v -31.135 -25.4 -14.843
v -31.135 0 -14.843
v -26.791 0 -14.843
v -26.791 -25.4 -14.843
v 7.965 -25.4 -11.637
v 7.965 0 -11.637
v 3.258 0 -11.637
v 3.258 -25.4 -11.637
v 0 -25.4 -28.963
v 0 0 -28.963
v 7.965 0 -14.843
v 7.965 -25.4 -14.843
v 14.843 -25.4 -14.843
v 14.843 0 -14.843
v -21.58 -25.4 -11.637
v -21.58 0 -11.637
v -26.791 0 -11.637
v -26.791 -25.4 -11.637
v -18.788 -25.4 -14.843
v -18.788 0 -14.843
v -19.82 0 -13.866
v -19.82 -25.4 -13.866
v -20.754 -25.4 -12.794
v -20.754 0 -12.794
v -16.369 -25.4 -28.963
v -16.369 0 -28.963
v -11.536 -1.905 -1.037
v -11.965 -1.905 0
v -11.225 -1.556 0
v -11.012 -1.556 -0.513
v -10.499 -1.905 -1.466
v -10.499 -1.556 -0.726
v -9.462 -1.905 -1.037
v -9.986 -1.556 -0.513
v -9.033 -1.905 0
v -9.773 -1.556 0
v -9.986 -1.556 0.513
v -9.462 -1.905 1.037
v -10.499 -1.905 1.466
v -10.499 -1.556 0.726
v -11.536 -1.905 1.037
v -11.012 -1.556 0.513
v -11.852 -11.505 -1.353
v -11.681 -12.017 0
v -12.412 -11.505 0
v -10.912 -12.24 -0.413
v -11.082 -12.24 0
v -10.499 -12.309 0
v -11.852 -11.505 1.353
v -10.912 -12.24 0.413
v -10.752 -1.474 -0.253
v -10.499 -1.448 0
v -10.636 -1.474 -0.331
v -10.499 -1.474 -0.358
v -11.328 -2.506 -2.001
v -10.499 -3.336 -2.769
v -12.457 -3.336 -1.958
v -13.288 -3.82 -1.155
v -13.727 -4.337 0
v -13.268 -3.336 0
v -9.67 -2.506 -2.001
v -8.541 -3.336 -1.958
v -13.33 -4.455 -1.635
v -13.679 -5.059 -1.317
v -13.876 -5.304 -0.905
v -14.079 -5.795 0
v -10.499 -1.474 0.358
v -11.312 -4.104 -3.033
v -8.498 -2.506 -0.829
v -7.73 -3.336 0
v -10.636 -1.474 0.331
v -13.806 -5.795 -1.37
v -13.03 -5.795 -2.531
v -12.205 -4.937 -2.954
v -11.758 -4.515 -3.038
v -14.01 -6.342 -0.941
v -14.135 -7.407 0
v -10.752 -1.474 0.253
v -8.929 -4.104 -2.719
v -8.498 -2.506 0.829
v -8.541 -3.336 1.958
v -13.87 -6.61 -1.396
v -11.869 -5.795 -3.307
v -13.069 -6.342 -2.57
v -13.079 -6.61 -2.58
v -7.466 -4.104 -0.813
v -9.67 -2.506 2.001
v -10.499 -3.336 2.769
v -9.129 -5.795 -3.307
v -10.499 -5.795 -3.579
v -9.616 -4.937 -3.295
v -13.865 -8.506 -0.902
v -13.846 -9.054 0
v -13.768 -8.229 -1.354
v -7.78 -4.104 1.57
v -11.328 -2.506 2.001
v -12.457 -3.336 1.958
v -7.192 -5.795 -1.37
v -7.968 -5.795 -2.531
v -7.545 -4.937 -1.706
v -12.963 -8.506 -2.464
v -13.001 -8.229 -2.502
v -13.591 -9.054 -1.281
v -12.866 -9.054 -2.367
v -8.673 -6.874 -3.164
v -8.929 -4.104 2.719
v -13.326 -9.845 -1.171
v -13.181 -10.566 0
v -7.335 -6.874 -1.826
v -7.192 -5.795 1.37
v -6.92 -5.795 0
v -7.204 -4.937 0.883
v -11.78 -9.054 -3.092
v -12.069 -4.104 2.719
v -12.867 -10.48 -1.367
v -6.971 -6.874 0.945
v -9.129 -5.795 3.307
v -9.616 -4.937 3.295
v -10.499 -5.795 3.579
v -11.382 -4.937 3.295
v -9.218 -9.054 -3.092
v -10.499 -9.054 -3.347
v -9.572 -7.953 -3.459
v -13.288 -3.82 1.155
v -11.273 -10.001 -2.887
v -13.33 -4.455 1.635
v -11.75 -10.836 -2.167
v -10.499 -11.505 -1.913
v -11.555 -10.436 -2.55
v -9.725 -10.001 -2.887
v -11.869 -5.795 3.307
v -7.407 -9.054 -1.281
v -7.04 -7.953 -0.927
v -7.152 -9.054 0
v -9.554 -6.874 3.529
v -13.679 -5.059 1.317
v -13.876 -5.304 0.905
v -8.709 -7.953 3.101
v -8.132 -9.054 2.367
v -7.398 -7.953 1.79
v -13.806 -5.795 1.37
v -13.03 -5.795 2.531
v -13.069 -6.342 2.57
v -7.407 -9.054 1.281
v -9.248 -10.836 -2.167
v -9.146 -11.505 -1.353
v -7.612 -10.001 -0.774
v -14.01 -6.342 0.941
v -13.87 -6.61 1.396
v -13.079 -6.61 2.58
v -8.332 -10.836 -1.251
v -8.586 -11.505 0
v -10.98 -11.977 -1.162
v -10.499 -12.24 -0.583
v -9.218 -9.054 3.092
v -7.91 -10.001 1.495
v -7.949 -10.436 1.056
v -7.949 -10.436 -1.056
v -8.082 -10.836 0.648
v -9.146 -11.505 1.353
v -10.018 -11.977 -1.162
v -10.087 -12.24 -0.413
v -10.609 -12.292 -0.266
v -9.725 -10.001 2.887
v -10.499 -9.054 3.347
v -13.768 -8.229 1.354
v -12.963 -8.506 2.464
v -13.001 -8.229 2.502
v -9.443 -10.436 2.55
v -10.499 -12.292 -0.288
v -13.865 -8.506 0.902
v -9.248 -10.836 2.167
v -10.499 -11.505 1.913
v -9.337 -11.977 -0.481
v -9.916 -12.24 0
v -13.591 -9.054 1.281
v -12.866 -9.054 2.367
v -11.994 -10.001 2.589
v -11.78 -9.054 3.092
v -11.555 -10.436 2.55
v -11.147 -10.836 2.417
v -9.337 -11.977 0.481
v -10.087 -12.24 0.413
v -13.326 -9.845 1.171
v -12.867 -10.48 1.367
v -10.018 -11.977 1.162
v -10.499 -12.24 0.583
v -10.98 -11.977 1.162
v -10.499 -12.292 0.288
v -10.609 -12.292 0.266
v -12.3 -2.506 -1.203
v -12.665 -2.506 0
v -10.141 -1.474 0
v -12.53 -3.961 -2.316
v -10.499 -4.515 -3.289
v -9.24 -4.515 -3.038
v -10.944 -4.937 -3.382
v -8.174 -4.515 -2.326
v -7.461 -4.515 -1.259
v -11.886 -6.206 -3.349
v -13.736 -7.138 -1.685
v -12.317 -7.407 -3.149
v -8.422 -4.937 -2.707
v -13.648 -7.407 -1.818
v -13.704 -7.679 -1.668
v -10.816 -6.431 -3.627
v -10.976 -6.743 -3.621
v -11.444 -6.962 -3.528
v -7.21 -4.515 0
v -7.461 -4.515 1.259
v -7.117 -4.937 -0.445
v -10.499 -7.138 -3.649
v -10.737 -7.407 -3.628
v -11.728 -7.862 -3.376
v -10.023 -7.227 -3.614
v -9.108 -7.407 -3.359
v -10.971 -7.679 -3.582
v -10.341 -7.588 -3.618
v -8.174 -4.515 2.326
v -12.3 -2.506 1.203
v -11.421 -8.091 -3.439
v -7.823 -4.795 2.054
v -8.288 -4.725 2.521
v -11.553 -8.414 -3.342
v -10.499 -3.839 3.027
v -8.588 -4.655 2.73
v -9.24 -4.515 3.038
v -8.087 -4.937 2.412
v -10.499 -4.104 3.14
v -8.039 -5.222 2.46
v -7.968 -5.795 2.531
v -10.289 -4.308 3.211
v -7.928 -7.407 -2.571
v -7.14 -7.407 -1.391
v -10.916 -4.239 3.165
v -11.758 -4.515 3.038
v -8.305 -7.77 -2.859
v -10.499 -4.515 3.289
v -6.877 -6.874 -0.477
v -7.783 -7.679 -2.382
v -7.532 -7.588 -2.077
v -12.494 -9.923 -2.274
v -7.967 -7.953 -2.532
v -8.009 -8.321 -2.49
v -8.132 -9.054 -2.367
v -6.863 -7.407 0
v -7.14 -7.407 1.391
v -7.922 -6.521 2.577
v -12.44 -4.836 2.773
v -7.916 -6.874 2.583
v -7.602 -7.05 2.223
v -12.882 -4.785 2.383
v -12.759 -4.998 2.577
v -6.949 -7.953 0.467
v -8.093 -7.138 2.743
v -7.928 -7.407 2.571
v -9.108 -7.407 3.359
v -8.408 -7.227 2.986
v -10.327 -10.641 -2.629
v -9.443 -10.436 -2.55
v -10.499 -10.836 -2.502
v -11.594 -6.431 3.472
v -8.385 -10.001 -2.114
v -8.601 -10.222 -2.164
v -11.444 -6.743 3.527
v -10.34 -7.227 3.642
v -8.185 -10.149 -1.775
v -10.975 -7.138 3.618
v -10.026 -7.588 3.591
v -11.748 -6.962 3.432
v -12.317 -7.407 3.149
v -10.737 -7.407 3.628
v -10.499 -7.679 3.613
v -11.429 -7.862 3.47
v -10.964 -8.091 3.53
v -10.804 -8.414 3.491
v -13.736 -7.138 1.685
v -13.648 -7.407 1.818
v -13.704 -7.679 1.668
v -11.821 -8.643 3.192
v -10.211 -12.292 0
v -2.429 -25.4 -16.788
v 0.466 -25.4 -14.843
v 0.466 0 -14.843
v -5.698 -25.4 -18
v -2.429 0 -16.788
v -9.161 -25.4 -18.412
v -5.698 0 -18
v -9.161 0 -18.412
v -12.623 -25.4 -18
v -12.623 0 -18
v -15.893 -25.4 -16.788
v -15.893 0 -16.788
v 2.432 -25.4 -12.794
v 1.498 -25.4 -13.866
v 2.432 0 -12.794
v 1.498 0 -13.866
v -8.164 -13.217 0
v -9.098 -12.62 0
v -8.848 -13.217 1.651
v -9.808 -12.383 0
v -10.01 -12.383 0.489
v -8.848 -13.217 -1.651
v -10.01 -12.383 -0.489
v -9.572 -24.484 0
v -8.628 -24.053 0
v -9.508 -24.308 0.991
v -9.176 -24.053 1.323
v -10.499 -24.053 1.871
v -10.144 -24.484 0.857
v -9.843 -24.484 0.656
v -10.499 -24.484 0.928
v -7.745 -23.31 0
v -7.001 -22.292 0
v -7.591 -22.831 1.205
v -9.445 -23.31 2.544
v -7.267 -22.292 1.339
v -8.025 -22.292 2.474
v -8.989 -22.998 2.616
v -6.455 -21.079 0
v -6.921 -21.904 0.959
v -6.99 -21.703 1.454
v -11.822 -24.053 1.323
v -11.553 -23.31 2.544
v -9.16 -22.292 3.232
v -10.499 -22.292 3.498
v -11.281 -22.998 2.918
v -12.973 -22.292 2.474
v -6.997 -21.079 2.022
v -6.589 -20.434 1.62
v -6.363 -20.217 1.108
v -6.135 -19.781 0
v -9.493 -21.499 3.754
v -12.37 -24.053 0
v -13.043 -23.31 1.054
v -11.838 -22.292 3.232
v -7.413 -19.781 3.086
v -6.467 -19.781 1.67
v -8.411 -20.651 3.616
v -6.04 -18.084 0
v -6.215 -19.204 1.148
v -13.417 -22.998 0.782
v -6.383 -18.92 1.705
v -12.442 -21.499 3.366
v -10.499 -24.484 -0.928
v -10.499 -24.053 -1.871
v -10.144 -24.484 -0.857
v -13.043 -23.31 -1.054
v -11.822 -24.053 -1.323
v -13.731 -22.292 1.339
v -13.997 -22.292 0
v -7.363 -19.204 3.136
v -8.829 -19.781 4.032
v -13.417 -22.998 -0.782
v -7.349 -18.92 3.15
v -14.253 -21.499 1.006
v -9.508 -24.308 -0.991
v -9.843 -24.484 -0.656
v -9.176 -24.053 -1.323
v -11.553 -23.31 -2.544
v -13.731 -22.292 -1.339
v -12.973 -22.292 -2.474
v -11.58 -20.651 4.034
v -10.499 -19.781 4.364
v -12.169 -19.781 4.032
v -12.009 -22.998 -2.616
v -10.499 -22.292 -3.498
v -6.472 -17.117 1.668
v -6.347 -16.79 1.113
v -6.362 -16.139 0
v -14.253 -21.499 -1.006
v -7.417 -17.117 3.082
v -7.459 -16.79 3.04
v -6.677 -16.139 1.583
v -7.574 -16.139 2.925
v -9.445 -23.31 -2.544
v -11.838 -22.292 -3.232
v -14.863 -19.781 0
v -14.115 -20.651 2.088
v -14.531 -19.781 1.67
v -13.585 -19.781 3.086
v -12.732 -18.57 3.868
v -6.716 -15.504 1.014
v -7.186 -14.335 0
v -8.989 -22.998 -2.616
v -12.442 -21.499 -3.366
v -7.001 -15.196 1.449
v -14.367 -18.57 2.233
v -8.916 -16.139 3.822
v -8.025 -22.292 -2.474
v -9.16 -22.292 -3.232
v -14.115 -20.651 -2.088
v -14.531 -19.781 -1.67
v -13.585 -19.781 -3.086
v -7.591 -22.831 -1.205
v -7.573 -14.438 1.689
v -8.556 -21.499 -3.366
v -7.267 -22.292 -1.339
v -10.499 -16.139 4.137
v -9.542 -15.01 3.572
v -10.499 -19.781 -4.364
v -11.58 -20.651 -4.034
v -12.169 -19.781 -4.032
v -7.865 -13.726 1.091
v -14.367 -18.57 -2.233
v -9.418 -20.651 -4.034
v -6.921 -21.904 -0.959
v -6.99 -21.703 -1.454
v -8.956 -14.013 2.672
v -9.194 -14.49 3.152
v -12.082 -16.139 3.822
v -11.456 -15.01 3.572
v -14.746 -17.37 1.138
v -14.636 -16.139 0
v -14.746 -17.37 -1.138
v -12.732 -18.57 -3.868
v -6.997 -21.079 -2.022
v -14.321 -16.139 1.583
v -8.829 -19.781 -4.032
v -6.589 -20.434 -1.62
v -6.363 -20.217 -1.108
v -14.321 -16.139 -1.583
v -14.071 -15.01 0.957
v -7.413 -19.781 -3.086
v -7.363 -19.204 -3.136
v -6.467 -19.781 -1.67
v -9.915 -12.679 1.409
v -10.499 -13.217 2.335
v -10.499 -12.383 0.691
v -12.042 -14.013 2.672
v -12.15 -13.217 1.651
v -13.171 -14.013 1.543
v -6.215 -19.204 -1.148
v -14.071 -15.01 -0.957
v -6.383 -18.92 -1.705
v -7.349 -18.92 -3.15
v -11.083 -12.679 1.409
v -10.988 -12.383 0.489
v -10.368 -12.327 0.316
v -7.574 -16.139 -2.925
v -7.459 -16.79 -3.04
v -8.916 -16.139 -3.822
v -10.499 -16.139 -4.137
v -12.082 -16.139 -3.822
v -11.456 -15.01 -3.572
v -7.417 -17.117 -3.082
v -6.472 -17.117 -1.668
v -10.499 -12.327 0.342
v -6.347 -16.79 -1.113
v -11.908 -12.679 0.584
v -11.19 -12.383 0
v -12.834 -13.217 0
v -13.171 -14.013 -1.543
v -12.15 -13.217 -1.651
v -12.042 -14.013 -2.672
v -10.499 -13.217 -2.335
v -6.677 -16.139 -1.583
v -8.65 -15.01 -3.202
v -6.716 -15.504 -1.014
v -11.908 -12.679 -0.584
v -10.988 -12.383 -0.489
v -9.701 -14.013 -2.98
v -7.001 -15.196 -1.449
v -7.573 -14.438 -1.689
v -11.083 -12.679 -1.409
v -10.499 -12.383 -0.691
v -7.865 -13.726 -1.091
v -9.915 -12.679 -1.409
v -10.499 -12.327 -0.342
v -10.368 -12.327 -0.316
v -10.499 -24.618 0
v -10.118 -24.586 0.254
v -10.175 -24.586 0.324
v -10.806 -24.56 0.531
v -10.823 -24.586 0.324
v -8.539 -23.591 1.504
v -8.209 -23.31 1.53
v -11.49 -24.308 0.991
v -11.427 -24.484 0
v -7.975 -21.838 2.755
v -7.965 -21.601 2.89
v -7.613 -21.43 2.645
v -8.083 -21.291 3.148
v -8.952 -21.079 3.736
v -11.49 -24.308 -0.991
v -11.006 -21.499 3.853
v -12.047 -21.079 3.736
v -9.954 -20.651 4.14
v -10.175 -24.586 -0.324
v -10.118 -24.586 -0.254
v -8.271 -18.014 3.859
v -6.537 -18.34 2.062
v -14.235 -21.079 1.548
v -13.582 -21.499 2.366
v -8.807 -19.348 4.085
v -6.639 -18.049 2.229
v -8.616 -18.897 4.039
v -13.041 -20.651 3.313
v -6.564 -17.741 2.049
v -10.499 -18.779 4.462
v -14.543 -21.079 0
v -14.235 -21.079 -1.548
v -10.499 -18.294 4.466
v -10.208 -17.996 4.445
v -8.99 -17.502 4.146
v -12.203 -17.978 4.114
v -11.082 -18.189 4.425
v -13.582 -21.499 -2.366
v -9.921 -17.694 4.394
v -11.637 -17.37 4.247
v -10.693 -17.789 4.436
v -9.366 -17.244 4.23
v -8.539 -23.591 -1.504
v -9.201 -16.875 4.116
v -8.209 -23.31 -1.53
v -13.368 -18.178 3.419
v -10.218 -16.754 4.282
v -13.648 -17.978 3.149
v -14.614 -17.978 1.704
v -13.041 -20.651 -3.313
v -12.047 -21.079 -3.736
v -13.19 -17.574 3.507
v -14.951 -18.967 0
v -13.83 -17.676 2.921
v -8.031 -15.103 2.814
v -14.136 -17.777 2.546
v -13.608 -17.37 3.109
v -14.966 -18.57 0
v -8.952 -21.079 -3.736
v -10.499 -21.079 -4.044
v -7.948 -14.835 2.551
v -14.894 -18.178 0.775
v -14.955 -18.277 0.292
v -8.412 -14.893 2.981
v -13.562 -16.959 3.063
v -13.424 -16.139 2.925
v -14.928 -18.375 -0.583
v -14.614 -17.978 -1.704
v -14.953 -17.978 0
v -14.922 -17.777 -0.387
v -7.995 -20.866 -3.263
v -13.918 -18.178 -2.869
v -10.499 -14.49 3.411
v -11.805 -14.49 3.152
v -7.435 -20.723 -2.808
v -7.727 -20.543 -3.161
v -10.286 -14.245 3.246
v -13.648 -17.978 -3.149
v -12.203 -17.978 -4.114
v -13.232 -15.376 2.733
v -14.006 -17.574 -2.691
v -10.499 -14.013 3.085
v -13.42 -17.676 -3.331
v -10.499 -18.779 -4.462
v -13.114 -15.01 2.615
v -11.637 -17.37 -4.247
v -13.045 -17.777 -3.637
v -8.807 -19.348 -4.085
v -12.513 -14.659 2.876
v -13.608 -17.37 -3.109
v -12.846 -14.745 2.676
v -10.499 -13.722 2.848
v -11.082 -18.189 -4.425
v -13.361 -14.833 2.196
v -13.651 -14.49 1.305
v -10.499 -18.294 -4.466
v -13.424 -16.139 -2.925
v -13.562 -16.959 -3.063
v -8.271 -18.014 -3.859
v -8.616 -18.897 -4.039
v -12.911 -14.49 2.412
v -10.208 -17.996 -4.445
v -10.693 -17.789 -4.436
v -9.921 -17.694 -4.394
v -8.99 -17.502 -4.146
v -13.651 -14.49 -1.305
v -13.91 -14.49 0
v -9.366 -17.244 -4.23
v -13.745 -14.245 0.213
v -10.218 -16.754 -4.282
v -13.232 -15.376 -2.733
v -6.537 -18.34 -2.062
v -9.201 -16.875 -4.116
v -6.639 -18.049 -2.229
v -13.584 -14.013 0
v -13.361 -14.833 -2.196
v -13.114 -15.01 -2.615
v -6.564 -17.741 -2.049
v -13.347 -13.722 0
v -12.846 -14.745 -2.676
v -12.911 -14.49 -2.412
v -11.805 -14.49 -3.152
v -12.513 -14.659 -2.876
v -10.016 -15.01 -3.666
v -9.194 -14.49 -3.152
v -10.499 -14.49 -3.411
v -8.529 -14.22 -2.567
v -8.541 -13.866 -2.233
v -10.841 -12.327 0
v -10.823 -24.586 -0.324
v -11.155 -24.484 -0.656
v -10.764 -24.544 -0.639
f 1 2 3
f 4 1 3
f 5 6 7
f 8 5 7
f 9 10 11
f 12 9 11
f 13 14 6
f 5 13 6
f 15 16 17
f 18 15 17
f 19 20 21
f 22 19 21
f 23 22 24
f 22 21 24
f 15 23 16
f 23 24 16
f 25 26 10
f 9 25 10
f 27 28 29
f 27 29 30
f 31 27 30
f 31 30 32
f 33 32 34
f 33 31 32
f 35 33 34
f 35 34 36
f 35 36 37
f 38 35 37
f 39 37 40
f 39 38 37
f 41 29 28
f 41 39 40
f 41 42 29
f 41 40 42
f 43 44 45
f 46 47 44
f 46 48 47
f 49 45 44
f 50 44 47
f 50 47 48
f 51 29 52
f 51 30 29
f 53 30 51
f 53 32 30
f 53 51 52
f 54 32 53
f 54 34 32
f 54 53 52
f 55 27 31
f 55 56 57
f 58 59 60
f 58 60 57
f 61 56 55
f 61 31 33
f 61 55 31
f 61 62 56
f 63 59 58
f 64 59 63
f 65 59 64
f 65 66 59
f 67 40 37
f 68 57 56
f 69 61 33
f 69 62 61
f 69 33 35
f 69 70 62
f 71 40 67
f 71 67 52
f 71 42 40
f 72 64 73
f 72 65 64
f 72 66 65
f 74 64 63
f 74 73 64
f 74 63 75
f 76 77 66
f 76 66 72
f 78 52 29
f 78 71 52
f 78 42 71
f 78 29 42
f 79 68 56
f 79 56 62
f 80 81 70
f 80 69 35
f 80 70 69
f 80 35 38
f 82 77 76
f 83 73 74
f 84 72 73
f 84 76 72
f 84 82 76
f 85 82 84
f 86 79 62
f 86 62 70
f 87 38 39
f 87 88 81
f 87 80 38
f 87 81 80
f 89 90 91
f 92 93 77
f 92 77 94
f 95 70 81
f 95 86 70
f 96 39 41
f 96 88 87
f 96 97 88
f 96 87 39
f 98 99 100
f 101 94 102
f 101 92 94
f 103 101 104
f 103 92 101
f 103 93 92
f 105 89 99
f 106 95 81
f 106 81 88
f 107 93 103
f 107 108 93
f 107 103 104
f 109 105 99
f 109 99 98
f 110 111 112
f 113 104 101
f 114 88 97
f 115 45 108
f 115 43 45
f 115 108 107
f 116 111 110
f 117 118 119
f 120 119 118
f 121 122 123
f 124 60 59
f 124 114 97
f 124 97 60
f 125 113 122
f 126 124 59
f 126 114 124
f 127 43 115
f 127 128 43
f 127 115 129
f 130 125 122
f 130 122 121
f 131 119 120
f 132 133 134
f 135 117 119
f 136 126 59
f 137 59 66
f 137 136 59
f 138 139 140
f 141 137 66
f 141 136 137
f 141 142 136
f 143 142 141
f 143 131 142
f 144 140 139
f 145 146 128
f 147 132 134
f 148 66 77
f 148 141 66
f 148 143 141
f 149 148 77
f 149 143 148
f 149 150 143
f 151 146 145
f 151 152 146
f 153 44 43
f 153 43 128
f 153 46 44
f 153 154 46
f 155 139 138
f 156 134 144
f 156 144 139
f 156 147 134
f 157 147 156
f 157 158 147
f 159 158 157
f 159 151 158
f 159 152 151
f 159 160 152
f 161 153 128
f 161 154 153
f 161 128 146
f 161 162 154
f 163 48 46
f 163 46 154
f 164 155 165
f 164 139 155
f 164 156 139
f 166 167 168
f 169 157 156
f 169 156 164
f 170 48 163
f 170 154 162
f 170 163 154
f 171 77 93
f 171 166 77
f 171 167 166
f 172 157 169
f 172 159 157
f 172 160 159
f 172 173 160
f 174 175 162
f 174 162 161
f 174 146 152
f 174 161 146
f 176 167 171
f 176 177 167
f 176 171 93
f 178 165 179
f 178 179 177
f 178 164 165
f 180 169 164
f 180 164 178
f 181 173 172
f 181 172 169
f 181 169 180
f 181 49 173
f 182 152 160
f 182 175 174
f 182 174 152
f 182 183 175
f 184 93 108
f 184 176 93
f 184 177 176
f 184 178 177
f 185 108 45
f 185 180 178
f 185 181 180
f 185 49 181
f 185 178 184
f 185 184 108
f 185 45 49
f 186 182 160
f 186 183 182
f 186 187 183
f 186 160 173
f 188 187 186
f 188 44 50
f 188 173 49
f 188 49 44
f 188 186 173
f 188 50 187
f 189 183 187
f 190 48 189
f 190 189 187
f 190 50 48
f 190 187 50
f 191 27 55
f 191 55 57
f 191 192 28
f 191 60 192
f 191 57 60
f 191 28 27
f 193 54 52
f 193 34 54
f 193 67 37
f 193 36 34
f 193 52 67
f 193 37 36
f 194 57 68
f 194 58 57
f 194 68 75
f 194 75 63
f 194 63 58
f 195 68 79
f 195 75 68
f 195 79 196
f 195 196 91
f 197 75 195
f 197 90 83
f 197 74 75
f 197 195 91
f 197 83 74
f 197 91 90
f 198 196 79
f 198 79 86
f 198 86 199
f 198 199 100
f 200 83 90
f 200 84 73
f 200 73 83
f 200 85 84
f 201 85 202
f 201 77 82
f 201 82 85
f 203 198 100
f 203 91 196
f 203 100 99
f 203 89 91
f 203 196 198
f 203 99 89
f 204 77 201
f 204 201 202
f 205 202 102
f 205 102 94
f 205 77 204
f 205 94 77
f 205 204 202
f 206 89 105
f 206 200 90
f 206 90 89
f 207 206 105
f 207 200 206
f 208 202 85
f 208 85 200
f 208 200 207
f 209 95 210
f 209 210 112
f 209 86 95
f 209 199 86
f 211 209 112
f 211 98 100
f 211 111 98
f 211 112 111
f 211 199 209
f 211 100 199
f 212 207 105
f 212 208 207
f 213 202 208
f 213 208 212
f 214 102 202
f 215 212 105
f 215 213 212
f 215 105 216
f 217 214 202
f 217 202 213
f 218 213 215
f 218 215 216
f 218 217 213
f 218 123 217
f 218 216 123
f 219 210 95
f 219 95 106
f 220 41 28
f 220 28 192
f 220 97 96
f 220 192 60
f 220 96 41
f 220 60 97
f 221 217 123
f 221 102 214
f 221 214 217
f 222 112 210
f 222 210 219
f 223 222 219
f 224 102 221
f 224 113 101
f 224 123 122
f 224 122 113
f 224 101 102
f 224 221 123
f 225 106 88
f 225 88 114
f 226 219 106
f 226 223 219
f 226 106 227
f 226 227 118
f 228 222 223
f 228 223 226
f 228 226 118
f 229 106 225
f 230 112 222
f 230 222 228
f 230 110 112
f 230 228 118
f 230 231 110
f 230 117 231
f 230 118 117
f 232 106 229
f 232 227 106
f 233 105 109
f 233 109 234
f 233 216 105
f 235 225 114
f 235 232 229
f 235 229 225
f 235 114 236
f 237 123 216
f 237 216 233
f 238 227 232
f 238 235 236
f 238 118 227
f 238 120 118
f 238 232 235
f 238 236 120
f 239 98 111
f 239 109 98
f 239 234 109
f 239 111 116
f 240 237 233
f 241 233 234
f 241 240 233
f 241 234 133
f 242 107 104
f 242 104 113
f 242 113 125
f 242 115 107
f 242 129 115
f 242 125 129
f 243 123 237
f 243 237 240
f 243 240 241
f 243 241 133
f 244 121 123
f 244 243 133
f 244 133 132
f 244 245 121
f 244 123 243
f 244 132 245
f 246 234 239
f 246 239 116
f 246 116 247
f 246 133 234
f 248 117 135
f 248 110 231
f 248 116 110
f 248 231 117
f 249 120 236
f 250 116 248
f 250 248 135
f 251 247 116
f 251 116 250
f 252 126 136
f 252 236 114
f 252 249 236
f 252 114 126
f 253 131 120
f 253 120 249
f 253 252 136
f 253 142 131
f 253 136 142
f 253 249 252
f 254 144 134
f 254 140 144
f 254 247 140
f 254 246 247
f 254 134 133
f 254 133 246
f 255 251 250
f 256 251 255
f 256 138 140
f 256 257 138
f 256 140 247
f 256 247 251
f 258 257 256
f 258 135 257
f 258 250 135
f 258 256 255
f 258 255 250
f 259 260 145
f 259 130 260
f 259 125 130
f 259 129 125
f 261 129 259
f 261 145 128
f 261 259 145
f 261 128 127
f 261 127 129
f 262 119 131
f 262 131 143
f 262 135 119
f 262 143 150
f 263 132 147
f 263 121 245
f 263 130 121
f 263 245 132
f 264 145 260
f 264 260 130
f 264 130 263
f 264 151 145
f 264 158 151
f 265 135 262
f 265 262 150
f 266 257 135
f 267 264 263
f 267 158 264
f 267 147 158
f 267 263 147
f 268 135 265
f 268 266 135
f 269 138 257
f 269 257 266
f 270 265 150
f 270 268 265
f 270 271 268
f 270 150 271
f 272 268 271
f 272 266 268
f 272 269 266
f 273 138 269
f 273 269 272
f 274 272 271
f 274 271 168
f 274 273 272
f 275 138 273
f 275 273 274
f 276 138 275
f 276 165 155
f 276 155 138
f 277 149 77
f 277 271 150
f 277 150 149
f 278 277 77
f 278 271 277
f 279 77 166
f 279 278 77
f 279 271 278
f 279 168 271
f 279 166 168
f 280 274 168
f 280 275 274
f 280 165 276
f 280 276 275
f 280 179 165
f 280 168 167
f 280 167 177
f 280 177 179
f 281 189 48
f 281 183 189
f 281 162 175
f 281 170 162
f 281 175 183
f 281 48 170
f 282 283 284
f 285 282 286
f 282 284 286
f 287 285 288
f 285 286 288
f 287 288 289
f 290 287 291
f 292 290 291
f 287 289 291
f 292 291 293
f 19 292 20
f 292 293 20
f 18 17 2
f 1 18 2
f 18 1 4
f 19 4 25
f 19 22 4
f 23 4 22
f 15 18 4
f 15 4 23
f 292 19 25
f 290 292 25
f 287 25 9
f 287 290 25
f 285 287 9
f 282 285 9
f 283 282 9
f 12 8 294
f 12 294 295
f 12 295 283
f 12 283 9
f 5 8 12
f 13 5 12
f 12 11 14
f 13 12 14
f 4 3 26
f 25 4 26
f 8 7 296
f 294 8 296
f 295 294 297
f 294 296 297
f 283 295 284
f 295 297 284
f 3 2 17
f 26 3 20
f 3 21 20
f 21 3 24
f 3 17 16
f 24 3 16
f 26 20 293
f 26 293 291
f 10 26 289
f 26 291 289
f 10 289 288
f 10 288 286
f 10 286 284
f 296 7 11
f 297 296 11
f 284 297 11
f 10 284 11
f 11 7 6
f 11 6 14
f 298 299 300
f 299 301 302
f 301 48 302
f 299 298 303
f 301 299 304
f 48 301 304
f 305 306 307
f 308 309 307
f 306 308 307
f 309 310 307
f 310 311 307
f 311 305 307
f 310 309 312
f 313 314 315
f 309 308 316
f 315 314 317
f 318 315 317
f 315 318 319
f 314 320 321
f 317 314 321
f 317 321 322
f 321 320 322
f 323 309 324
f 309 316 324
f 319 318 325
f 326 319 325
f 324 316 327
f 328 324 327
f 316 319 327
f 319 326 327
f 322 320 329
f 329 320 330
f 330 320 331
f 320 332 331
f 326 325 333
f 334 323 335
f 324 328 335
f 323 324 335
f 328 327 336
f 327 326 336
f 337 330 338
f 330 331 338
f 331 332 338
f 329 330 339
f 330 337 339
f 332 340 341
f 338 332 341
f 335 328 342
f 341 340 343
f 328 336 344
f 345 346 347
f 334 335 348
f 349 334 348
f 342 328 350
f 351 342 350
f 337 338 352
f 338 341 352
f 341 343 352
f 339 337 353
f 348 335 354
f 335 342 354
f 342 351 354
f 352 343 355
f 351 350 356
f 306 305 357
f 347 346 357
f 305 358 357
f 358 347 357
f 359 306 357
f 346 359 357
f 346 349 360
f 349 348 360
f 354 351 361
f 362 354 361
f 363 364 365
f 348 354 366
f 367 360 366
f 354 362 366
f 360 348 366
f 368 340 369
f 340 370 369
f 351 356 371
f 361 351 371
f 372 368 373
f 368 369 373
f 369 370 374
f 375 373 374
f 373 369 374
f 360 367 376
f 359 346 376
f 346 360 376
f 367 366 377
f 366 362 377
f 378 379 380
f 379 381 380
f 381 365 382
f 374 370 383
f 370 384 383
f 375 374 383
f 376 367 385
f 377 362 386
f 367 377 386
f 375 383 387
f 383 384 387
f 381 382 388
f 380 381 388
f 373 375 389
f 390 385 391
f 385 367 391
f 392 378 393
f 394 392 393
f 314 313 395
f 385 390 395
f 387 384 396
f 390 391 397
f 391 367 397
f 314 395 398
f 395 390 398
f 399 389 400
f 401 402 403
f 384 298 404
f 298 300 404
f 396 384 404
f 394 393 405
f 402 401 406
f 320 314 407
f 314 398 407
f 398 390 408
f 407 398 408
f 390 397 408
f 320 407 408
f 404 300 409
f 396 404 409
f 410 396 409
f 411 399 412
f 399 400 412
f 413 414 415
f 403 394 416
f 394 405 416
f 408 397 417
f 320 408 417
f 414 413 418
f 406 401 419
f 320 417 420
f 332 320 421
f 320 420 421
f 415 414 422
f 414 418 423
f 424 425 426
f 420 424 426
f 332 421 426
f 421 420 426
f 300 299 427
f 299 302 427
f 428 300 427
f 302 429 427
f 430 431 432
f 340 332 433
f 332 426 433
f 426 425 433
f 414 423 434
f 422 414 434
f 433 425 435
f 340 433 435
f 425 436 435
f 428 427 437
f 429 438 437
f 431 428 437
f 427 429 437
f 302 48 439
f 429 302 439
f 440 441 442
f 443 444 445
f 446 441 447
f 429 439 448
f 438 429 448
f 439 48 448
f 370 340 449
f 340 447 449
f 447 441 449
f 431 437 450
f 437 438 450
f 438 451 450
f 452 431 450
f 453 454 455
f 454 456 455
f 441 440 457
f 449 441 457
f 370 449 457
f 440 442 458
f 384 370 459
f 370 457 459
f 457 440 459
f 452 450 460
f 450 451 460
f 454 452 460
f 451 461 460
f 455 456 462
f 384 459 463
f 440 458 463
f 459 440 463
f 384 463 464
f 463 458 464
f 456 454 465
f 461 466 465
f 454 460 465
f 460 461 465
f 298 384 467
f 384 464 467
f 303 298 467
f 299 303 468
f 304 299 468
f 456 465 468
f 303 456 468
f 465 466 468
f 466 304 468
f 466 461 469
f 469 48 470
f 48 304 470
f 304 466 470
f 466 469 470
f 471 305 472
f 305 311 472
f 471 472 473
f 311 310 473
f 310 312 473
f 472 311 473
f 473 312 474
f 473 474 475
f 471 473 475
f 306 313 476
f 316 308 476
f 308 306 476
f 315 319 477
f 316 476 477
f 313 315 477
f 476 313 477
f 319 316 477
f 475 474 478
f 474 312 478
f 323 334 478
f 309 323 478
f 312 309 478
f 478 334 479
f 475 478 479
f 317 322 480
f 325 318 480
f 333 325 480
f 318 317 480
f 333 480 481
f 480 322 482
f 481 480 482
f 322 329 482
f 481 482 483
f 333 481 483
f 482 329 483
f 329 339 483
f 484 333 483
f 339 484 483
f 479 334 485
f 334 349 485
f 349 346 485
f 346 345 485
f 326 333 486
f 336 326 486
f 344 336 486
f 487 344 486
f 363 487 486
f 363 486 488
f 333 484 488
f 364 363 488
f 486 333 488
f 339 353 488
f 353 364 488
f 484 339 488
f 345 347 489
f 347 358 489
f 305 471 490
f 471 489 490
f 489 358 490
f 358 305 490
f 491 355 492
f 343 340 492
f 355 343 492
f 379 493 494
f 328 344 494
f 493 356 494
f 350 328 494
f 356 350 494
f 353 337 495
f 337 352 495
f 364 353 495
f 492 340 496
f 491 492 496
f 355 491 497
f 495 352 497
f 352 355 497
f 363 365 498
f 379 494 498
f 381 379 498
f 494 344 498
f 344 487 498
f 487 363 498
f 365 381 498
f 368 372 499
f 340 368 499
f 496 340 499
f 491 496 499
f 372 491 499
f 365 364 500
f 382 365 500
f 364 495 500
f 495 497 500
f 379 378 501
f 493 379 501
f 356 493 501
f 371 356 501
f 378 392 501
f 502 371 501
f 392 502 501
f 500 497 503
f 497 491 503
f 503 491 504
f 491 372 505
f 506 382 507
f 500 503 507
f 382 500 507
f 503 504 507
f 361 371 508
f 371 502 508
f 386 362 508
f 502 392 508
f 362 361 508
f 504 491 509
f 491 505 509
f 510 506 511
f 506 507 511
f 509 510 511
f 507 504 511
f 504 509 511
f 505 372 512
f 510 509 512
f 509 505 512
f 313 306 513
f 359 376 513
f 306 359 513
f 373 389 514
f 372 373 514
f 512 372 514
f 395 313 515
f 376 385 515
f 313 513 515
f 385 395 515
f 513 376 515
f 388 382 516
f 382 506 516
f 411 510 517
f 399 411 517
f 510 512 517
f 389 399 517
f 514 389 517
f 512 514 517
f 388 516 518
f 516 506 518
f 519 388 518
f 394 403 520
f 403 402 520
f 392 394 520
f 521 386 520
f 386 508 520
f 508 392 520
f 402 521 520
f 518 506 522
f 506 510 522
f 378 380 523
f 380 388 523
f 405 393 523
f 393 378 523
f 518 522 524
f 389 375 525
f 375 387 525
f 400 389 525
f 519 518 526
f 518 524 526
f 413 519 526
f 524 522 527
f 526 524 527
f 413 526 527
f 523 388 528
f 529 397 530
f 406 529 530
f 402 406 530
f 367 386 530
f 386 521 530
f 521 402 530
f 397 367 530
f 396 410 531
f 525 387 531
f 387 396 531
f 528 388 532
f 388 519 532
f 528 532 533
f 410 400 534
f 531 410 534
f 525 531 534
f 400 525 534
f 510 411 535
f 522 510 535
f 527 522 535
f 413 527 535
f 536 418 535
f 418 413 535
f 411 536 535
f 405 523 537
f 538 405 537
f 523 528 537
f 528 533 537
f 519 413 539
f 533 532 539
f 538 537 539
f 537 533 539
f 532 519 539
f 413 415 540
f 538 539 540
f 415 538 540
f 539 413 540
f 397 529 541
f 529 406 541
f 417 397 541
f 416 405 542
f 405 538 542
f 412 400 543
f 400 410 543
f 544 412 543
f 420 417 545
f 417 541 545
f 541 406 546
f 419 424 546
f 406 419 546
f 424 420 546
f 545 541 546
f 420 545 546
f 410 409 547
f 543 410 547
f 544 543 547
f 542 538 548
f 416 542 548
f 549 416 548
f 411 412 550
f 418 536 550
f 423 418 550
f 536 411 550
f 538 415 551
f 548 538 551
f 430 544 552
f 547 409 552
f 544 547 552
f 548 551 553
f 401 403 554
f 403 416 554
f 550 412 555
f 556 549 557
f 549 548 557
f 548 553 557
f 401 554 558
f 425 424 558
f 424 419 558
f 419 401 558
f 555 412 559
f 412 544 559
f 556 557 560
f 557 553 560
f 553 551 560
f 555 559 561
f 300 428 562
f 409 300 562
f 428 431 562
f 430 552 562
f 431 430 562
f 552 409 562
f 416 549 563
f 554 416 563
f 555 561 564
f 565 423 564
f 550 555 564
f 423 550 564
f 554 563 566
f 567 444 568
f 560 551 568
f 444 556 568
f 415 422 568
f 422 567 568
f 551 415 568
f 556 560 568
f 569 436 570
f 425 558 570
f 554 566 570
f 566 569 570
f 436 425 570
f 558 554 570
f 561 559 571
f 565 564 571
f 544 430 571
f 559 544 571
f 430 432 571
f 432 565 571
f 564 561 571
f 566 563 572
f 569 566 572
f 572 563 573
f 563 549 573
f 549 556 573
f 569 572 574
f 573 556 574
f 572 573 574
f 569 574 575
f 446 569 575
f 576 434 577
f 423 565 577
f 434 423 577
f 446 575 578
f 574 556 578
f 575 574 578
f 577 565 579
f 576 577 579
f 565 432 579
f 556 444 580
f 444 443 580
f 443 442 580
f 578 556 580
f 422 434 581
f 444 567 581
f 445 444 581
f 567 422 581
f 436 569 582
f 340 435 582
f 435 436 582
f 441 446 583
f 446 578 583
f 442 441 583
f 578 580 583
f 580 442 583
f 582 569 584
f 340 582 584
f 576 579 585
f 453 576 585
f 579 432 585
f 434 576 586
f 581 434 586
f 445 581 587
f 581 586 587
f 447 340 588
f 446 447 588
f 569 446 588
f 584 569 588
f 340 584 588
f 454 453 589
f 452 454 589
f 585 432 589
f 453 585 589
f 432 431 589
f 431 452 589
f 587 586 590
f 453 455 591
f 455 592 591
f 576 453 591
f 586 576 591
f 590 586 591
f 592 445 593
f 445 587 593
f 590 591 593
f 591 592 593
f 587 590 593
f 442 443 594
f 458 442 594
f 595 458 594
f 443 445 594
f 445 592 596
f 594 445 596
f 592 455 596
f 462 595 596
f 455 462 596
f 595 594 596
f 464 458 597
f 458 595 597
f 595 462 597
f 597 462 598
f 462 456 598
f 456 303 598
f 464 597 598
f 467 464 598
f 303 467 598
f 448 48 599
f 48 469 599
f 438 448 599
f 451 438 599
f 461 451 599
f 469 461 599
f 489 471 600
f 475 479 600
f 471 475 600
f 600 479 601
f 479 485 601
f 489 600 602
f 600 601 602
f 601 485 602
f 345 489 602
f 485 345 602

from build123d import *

# Parameters (mm, degrees)
F1_DEPTH = 25.4


# Not quite as in the source:
# - ends of sketch curves that miss each other by under 0.0002 mm in the source are joined


with BuildPart() as f1:
    # F0 (on Front) → F1 (new body)
    with BuildSketch(Plane.XZ):
        with BuildLine():
            Line((-18.7875360372, -14.8434843868), (-26.7906785011, -14.8434843868))
            Line((-26.7906785011, -14.8434843868), (-16.3692074327, -28.9628971368))
            Line((-16.3692074327, -28.9628971368), (0, -28.9628971368))
            Line((0, -28.9628971368), (7.9647982493, -14.8434843868))
            Line((7.9647982493, -14.8434843868), (0.4659200925, -14.8434843868))
            ThreePointArc((0.4659200925, -14.8434843868), (-9.1608079724, -18.4115854923), (-18.7875360372, -14.8434843868))
        make_face()
        with BuildLine():
            Line((-31.1351139098, -14.8434843868), (-26.7906785011, -14.8434843868))
            Line((-26.7906785011, -14.8434843868), (-18.7875360372, -14.8434843868))
            ThreePointArc((-18.7875360372, -14.8434843868), (-20.2997307946, -13.3411894824), (-21.5799429669, -11.6368773754))
            Line((-21.5799429669, -11.6368773754), (-26.7906785011, -11.6368773754))
            Line((-26.7906785011, -11.6368773754), (-31.1351139098, -14.8434843868))
        make_face()
        with BuildLine():
            ThreePointArc((3.2583270222, -11.6368773754), (1.9781148499, -13.3411894824), (0.4659200925, -14.8434843868))
            Line((0.4659200925, -14.8434843868), (7.9647982493, -14.8434843868))
            Line((7.9647982493, -14.8434843868), (14.8434843868, -14.8434843868))
            Line((14.8434843868, -14.8434843868), (7.9647982493, -11.6368773754))
            Line((7.9647982493, -11.6368773754), (3.2583270222, -11.6368773754))
        make_face()
    extrude(amount=F1_DEPTH)


with BuildPart() as f3:
    # F2 (on Top) → F3 (revolve)
    with BuildSketch(Plane.XY):
        with BuildLine():
            Line((-10.4990489781, -12.3092317954), (-10.4990489781, -1.4481449034))
            add(Edge.make_bspline(
                [(-10.4990489781, -1.4481449034), (-14.1520259814, -1.4481449034), (-14.1520259814, -6.8786880001), (-14.1520259814, -12.3092310969), (-10.4990489781, -12.3092317954)],
                knots=[0, 0, 0, 1.5707963268, 1.5707963268, 3.1415926536, 3.1415926536, 3.1415926536], degree=2, weights=[1, 0.7071067812, 1, 0.7071067812, 1]))
        make_face()
    revolve(axis=Axis((-10.4990489781, -13.0333028501, 0), (0, -1, 0)))


with BuildPart() as f3b:
    # F2 (on Top) → F3, piece 2 (revolve)
    with BuildSketch(Plane.XY):
        with BuildLine():
            add(Edge.make_bspline(
                [(-10.4990489781, -24.6184607968), (-6.0316230931, -24.6184607968), (-6.0316230931, -18.4638462961), (-6.0316230931, -12.3092317954), (-10.4990489781, -12.3092317954)],
                knots=[3.1415926536, 3.1415926536, 3.1415926536, 4.7123889804, 4.7123889804, 6.2831853072, 6.2831853072, 6.2831853072], degree=2, weights=[1, 0.7071067812, 1, 0.7071067812, 1]))
            Line((-10.4990489781, -12.3092317954), (-10.4990489781, -24.6184607968))
        make_face()
    revolve(axis=Axis((-10.4990489781, -13.0333028501, 0), (0, -1, 0)))


solid = Compound([f1.part, f3.part, f3b.part])
